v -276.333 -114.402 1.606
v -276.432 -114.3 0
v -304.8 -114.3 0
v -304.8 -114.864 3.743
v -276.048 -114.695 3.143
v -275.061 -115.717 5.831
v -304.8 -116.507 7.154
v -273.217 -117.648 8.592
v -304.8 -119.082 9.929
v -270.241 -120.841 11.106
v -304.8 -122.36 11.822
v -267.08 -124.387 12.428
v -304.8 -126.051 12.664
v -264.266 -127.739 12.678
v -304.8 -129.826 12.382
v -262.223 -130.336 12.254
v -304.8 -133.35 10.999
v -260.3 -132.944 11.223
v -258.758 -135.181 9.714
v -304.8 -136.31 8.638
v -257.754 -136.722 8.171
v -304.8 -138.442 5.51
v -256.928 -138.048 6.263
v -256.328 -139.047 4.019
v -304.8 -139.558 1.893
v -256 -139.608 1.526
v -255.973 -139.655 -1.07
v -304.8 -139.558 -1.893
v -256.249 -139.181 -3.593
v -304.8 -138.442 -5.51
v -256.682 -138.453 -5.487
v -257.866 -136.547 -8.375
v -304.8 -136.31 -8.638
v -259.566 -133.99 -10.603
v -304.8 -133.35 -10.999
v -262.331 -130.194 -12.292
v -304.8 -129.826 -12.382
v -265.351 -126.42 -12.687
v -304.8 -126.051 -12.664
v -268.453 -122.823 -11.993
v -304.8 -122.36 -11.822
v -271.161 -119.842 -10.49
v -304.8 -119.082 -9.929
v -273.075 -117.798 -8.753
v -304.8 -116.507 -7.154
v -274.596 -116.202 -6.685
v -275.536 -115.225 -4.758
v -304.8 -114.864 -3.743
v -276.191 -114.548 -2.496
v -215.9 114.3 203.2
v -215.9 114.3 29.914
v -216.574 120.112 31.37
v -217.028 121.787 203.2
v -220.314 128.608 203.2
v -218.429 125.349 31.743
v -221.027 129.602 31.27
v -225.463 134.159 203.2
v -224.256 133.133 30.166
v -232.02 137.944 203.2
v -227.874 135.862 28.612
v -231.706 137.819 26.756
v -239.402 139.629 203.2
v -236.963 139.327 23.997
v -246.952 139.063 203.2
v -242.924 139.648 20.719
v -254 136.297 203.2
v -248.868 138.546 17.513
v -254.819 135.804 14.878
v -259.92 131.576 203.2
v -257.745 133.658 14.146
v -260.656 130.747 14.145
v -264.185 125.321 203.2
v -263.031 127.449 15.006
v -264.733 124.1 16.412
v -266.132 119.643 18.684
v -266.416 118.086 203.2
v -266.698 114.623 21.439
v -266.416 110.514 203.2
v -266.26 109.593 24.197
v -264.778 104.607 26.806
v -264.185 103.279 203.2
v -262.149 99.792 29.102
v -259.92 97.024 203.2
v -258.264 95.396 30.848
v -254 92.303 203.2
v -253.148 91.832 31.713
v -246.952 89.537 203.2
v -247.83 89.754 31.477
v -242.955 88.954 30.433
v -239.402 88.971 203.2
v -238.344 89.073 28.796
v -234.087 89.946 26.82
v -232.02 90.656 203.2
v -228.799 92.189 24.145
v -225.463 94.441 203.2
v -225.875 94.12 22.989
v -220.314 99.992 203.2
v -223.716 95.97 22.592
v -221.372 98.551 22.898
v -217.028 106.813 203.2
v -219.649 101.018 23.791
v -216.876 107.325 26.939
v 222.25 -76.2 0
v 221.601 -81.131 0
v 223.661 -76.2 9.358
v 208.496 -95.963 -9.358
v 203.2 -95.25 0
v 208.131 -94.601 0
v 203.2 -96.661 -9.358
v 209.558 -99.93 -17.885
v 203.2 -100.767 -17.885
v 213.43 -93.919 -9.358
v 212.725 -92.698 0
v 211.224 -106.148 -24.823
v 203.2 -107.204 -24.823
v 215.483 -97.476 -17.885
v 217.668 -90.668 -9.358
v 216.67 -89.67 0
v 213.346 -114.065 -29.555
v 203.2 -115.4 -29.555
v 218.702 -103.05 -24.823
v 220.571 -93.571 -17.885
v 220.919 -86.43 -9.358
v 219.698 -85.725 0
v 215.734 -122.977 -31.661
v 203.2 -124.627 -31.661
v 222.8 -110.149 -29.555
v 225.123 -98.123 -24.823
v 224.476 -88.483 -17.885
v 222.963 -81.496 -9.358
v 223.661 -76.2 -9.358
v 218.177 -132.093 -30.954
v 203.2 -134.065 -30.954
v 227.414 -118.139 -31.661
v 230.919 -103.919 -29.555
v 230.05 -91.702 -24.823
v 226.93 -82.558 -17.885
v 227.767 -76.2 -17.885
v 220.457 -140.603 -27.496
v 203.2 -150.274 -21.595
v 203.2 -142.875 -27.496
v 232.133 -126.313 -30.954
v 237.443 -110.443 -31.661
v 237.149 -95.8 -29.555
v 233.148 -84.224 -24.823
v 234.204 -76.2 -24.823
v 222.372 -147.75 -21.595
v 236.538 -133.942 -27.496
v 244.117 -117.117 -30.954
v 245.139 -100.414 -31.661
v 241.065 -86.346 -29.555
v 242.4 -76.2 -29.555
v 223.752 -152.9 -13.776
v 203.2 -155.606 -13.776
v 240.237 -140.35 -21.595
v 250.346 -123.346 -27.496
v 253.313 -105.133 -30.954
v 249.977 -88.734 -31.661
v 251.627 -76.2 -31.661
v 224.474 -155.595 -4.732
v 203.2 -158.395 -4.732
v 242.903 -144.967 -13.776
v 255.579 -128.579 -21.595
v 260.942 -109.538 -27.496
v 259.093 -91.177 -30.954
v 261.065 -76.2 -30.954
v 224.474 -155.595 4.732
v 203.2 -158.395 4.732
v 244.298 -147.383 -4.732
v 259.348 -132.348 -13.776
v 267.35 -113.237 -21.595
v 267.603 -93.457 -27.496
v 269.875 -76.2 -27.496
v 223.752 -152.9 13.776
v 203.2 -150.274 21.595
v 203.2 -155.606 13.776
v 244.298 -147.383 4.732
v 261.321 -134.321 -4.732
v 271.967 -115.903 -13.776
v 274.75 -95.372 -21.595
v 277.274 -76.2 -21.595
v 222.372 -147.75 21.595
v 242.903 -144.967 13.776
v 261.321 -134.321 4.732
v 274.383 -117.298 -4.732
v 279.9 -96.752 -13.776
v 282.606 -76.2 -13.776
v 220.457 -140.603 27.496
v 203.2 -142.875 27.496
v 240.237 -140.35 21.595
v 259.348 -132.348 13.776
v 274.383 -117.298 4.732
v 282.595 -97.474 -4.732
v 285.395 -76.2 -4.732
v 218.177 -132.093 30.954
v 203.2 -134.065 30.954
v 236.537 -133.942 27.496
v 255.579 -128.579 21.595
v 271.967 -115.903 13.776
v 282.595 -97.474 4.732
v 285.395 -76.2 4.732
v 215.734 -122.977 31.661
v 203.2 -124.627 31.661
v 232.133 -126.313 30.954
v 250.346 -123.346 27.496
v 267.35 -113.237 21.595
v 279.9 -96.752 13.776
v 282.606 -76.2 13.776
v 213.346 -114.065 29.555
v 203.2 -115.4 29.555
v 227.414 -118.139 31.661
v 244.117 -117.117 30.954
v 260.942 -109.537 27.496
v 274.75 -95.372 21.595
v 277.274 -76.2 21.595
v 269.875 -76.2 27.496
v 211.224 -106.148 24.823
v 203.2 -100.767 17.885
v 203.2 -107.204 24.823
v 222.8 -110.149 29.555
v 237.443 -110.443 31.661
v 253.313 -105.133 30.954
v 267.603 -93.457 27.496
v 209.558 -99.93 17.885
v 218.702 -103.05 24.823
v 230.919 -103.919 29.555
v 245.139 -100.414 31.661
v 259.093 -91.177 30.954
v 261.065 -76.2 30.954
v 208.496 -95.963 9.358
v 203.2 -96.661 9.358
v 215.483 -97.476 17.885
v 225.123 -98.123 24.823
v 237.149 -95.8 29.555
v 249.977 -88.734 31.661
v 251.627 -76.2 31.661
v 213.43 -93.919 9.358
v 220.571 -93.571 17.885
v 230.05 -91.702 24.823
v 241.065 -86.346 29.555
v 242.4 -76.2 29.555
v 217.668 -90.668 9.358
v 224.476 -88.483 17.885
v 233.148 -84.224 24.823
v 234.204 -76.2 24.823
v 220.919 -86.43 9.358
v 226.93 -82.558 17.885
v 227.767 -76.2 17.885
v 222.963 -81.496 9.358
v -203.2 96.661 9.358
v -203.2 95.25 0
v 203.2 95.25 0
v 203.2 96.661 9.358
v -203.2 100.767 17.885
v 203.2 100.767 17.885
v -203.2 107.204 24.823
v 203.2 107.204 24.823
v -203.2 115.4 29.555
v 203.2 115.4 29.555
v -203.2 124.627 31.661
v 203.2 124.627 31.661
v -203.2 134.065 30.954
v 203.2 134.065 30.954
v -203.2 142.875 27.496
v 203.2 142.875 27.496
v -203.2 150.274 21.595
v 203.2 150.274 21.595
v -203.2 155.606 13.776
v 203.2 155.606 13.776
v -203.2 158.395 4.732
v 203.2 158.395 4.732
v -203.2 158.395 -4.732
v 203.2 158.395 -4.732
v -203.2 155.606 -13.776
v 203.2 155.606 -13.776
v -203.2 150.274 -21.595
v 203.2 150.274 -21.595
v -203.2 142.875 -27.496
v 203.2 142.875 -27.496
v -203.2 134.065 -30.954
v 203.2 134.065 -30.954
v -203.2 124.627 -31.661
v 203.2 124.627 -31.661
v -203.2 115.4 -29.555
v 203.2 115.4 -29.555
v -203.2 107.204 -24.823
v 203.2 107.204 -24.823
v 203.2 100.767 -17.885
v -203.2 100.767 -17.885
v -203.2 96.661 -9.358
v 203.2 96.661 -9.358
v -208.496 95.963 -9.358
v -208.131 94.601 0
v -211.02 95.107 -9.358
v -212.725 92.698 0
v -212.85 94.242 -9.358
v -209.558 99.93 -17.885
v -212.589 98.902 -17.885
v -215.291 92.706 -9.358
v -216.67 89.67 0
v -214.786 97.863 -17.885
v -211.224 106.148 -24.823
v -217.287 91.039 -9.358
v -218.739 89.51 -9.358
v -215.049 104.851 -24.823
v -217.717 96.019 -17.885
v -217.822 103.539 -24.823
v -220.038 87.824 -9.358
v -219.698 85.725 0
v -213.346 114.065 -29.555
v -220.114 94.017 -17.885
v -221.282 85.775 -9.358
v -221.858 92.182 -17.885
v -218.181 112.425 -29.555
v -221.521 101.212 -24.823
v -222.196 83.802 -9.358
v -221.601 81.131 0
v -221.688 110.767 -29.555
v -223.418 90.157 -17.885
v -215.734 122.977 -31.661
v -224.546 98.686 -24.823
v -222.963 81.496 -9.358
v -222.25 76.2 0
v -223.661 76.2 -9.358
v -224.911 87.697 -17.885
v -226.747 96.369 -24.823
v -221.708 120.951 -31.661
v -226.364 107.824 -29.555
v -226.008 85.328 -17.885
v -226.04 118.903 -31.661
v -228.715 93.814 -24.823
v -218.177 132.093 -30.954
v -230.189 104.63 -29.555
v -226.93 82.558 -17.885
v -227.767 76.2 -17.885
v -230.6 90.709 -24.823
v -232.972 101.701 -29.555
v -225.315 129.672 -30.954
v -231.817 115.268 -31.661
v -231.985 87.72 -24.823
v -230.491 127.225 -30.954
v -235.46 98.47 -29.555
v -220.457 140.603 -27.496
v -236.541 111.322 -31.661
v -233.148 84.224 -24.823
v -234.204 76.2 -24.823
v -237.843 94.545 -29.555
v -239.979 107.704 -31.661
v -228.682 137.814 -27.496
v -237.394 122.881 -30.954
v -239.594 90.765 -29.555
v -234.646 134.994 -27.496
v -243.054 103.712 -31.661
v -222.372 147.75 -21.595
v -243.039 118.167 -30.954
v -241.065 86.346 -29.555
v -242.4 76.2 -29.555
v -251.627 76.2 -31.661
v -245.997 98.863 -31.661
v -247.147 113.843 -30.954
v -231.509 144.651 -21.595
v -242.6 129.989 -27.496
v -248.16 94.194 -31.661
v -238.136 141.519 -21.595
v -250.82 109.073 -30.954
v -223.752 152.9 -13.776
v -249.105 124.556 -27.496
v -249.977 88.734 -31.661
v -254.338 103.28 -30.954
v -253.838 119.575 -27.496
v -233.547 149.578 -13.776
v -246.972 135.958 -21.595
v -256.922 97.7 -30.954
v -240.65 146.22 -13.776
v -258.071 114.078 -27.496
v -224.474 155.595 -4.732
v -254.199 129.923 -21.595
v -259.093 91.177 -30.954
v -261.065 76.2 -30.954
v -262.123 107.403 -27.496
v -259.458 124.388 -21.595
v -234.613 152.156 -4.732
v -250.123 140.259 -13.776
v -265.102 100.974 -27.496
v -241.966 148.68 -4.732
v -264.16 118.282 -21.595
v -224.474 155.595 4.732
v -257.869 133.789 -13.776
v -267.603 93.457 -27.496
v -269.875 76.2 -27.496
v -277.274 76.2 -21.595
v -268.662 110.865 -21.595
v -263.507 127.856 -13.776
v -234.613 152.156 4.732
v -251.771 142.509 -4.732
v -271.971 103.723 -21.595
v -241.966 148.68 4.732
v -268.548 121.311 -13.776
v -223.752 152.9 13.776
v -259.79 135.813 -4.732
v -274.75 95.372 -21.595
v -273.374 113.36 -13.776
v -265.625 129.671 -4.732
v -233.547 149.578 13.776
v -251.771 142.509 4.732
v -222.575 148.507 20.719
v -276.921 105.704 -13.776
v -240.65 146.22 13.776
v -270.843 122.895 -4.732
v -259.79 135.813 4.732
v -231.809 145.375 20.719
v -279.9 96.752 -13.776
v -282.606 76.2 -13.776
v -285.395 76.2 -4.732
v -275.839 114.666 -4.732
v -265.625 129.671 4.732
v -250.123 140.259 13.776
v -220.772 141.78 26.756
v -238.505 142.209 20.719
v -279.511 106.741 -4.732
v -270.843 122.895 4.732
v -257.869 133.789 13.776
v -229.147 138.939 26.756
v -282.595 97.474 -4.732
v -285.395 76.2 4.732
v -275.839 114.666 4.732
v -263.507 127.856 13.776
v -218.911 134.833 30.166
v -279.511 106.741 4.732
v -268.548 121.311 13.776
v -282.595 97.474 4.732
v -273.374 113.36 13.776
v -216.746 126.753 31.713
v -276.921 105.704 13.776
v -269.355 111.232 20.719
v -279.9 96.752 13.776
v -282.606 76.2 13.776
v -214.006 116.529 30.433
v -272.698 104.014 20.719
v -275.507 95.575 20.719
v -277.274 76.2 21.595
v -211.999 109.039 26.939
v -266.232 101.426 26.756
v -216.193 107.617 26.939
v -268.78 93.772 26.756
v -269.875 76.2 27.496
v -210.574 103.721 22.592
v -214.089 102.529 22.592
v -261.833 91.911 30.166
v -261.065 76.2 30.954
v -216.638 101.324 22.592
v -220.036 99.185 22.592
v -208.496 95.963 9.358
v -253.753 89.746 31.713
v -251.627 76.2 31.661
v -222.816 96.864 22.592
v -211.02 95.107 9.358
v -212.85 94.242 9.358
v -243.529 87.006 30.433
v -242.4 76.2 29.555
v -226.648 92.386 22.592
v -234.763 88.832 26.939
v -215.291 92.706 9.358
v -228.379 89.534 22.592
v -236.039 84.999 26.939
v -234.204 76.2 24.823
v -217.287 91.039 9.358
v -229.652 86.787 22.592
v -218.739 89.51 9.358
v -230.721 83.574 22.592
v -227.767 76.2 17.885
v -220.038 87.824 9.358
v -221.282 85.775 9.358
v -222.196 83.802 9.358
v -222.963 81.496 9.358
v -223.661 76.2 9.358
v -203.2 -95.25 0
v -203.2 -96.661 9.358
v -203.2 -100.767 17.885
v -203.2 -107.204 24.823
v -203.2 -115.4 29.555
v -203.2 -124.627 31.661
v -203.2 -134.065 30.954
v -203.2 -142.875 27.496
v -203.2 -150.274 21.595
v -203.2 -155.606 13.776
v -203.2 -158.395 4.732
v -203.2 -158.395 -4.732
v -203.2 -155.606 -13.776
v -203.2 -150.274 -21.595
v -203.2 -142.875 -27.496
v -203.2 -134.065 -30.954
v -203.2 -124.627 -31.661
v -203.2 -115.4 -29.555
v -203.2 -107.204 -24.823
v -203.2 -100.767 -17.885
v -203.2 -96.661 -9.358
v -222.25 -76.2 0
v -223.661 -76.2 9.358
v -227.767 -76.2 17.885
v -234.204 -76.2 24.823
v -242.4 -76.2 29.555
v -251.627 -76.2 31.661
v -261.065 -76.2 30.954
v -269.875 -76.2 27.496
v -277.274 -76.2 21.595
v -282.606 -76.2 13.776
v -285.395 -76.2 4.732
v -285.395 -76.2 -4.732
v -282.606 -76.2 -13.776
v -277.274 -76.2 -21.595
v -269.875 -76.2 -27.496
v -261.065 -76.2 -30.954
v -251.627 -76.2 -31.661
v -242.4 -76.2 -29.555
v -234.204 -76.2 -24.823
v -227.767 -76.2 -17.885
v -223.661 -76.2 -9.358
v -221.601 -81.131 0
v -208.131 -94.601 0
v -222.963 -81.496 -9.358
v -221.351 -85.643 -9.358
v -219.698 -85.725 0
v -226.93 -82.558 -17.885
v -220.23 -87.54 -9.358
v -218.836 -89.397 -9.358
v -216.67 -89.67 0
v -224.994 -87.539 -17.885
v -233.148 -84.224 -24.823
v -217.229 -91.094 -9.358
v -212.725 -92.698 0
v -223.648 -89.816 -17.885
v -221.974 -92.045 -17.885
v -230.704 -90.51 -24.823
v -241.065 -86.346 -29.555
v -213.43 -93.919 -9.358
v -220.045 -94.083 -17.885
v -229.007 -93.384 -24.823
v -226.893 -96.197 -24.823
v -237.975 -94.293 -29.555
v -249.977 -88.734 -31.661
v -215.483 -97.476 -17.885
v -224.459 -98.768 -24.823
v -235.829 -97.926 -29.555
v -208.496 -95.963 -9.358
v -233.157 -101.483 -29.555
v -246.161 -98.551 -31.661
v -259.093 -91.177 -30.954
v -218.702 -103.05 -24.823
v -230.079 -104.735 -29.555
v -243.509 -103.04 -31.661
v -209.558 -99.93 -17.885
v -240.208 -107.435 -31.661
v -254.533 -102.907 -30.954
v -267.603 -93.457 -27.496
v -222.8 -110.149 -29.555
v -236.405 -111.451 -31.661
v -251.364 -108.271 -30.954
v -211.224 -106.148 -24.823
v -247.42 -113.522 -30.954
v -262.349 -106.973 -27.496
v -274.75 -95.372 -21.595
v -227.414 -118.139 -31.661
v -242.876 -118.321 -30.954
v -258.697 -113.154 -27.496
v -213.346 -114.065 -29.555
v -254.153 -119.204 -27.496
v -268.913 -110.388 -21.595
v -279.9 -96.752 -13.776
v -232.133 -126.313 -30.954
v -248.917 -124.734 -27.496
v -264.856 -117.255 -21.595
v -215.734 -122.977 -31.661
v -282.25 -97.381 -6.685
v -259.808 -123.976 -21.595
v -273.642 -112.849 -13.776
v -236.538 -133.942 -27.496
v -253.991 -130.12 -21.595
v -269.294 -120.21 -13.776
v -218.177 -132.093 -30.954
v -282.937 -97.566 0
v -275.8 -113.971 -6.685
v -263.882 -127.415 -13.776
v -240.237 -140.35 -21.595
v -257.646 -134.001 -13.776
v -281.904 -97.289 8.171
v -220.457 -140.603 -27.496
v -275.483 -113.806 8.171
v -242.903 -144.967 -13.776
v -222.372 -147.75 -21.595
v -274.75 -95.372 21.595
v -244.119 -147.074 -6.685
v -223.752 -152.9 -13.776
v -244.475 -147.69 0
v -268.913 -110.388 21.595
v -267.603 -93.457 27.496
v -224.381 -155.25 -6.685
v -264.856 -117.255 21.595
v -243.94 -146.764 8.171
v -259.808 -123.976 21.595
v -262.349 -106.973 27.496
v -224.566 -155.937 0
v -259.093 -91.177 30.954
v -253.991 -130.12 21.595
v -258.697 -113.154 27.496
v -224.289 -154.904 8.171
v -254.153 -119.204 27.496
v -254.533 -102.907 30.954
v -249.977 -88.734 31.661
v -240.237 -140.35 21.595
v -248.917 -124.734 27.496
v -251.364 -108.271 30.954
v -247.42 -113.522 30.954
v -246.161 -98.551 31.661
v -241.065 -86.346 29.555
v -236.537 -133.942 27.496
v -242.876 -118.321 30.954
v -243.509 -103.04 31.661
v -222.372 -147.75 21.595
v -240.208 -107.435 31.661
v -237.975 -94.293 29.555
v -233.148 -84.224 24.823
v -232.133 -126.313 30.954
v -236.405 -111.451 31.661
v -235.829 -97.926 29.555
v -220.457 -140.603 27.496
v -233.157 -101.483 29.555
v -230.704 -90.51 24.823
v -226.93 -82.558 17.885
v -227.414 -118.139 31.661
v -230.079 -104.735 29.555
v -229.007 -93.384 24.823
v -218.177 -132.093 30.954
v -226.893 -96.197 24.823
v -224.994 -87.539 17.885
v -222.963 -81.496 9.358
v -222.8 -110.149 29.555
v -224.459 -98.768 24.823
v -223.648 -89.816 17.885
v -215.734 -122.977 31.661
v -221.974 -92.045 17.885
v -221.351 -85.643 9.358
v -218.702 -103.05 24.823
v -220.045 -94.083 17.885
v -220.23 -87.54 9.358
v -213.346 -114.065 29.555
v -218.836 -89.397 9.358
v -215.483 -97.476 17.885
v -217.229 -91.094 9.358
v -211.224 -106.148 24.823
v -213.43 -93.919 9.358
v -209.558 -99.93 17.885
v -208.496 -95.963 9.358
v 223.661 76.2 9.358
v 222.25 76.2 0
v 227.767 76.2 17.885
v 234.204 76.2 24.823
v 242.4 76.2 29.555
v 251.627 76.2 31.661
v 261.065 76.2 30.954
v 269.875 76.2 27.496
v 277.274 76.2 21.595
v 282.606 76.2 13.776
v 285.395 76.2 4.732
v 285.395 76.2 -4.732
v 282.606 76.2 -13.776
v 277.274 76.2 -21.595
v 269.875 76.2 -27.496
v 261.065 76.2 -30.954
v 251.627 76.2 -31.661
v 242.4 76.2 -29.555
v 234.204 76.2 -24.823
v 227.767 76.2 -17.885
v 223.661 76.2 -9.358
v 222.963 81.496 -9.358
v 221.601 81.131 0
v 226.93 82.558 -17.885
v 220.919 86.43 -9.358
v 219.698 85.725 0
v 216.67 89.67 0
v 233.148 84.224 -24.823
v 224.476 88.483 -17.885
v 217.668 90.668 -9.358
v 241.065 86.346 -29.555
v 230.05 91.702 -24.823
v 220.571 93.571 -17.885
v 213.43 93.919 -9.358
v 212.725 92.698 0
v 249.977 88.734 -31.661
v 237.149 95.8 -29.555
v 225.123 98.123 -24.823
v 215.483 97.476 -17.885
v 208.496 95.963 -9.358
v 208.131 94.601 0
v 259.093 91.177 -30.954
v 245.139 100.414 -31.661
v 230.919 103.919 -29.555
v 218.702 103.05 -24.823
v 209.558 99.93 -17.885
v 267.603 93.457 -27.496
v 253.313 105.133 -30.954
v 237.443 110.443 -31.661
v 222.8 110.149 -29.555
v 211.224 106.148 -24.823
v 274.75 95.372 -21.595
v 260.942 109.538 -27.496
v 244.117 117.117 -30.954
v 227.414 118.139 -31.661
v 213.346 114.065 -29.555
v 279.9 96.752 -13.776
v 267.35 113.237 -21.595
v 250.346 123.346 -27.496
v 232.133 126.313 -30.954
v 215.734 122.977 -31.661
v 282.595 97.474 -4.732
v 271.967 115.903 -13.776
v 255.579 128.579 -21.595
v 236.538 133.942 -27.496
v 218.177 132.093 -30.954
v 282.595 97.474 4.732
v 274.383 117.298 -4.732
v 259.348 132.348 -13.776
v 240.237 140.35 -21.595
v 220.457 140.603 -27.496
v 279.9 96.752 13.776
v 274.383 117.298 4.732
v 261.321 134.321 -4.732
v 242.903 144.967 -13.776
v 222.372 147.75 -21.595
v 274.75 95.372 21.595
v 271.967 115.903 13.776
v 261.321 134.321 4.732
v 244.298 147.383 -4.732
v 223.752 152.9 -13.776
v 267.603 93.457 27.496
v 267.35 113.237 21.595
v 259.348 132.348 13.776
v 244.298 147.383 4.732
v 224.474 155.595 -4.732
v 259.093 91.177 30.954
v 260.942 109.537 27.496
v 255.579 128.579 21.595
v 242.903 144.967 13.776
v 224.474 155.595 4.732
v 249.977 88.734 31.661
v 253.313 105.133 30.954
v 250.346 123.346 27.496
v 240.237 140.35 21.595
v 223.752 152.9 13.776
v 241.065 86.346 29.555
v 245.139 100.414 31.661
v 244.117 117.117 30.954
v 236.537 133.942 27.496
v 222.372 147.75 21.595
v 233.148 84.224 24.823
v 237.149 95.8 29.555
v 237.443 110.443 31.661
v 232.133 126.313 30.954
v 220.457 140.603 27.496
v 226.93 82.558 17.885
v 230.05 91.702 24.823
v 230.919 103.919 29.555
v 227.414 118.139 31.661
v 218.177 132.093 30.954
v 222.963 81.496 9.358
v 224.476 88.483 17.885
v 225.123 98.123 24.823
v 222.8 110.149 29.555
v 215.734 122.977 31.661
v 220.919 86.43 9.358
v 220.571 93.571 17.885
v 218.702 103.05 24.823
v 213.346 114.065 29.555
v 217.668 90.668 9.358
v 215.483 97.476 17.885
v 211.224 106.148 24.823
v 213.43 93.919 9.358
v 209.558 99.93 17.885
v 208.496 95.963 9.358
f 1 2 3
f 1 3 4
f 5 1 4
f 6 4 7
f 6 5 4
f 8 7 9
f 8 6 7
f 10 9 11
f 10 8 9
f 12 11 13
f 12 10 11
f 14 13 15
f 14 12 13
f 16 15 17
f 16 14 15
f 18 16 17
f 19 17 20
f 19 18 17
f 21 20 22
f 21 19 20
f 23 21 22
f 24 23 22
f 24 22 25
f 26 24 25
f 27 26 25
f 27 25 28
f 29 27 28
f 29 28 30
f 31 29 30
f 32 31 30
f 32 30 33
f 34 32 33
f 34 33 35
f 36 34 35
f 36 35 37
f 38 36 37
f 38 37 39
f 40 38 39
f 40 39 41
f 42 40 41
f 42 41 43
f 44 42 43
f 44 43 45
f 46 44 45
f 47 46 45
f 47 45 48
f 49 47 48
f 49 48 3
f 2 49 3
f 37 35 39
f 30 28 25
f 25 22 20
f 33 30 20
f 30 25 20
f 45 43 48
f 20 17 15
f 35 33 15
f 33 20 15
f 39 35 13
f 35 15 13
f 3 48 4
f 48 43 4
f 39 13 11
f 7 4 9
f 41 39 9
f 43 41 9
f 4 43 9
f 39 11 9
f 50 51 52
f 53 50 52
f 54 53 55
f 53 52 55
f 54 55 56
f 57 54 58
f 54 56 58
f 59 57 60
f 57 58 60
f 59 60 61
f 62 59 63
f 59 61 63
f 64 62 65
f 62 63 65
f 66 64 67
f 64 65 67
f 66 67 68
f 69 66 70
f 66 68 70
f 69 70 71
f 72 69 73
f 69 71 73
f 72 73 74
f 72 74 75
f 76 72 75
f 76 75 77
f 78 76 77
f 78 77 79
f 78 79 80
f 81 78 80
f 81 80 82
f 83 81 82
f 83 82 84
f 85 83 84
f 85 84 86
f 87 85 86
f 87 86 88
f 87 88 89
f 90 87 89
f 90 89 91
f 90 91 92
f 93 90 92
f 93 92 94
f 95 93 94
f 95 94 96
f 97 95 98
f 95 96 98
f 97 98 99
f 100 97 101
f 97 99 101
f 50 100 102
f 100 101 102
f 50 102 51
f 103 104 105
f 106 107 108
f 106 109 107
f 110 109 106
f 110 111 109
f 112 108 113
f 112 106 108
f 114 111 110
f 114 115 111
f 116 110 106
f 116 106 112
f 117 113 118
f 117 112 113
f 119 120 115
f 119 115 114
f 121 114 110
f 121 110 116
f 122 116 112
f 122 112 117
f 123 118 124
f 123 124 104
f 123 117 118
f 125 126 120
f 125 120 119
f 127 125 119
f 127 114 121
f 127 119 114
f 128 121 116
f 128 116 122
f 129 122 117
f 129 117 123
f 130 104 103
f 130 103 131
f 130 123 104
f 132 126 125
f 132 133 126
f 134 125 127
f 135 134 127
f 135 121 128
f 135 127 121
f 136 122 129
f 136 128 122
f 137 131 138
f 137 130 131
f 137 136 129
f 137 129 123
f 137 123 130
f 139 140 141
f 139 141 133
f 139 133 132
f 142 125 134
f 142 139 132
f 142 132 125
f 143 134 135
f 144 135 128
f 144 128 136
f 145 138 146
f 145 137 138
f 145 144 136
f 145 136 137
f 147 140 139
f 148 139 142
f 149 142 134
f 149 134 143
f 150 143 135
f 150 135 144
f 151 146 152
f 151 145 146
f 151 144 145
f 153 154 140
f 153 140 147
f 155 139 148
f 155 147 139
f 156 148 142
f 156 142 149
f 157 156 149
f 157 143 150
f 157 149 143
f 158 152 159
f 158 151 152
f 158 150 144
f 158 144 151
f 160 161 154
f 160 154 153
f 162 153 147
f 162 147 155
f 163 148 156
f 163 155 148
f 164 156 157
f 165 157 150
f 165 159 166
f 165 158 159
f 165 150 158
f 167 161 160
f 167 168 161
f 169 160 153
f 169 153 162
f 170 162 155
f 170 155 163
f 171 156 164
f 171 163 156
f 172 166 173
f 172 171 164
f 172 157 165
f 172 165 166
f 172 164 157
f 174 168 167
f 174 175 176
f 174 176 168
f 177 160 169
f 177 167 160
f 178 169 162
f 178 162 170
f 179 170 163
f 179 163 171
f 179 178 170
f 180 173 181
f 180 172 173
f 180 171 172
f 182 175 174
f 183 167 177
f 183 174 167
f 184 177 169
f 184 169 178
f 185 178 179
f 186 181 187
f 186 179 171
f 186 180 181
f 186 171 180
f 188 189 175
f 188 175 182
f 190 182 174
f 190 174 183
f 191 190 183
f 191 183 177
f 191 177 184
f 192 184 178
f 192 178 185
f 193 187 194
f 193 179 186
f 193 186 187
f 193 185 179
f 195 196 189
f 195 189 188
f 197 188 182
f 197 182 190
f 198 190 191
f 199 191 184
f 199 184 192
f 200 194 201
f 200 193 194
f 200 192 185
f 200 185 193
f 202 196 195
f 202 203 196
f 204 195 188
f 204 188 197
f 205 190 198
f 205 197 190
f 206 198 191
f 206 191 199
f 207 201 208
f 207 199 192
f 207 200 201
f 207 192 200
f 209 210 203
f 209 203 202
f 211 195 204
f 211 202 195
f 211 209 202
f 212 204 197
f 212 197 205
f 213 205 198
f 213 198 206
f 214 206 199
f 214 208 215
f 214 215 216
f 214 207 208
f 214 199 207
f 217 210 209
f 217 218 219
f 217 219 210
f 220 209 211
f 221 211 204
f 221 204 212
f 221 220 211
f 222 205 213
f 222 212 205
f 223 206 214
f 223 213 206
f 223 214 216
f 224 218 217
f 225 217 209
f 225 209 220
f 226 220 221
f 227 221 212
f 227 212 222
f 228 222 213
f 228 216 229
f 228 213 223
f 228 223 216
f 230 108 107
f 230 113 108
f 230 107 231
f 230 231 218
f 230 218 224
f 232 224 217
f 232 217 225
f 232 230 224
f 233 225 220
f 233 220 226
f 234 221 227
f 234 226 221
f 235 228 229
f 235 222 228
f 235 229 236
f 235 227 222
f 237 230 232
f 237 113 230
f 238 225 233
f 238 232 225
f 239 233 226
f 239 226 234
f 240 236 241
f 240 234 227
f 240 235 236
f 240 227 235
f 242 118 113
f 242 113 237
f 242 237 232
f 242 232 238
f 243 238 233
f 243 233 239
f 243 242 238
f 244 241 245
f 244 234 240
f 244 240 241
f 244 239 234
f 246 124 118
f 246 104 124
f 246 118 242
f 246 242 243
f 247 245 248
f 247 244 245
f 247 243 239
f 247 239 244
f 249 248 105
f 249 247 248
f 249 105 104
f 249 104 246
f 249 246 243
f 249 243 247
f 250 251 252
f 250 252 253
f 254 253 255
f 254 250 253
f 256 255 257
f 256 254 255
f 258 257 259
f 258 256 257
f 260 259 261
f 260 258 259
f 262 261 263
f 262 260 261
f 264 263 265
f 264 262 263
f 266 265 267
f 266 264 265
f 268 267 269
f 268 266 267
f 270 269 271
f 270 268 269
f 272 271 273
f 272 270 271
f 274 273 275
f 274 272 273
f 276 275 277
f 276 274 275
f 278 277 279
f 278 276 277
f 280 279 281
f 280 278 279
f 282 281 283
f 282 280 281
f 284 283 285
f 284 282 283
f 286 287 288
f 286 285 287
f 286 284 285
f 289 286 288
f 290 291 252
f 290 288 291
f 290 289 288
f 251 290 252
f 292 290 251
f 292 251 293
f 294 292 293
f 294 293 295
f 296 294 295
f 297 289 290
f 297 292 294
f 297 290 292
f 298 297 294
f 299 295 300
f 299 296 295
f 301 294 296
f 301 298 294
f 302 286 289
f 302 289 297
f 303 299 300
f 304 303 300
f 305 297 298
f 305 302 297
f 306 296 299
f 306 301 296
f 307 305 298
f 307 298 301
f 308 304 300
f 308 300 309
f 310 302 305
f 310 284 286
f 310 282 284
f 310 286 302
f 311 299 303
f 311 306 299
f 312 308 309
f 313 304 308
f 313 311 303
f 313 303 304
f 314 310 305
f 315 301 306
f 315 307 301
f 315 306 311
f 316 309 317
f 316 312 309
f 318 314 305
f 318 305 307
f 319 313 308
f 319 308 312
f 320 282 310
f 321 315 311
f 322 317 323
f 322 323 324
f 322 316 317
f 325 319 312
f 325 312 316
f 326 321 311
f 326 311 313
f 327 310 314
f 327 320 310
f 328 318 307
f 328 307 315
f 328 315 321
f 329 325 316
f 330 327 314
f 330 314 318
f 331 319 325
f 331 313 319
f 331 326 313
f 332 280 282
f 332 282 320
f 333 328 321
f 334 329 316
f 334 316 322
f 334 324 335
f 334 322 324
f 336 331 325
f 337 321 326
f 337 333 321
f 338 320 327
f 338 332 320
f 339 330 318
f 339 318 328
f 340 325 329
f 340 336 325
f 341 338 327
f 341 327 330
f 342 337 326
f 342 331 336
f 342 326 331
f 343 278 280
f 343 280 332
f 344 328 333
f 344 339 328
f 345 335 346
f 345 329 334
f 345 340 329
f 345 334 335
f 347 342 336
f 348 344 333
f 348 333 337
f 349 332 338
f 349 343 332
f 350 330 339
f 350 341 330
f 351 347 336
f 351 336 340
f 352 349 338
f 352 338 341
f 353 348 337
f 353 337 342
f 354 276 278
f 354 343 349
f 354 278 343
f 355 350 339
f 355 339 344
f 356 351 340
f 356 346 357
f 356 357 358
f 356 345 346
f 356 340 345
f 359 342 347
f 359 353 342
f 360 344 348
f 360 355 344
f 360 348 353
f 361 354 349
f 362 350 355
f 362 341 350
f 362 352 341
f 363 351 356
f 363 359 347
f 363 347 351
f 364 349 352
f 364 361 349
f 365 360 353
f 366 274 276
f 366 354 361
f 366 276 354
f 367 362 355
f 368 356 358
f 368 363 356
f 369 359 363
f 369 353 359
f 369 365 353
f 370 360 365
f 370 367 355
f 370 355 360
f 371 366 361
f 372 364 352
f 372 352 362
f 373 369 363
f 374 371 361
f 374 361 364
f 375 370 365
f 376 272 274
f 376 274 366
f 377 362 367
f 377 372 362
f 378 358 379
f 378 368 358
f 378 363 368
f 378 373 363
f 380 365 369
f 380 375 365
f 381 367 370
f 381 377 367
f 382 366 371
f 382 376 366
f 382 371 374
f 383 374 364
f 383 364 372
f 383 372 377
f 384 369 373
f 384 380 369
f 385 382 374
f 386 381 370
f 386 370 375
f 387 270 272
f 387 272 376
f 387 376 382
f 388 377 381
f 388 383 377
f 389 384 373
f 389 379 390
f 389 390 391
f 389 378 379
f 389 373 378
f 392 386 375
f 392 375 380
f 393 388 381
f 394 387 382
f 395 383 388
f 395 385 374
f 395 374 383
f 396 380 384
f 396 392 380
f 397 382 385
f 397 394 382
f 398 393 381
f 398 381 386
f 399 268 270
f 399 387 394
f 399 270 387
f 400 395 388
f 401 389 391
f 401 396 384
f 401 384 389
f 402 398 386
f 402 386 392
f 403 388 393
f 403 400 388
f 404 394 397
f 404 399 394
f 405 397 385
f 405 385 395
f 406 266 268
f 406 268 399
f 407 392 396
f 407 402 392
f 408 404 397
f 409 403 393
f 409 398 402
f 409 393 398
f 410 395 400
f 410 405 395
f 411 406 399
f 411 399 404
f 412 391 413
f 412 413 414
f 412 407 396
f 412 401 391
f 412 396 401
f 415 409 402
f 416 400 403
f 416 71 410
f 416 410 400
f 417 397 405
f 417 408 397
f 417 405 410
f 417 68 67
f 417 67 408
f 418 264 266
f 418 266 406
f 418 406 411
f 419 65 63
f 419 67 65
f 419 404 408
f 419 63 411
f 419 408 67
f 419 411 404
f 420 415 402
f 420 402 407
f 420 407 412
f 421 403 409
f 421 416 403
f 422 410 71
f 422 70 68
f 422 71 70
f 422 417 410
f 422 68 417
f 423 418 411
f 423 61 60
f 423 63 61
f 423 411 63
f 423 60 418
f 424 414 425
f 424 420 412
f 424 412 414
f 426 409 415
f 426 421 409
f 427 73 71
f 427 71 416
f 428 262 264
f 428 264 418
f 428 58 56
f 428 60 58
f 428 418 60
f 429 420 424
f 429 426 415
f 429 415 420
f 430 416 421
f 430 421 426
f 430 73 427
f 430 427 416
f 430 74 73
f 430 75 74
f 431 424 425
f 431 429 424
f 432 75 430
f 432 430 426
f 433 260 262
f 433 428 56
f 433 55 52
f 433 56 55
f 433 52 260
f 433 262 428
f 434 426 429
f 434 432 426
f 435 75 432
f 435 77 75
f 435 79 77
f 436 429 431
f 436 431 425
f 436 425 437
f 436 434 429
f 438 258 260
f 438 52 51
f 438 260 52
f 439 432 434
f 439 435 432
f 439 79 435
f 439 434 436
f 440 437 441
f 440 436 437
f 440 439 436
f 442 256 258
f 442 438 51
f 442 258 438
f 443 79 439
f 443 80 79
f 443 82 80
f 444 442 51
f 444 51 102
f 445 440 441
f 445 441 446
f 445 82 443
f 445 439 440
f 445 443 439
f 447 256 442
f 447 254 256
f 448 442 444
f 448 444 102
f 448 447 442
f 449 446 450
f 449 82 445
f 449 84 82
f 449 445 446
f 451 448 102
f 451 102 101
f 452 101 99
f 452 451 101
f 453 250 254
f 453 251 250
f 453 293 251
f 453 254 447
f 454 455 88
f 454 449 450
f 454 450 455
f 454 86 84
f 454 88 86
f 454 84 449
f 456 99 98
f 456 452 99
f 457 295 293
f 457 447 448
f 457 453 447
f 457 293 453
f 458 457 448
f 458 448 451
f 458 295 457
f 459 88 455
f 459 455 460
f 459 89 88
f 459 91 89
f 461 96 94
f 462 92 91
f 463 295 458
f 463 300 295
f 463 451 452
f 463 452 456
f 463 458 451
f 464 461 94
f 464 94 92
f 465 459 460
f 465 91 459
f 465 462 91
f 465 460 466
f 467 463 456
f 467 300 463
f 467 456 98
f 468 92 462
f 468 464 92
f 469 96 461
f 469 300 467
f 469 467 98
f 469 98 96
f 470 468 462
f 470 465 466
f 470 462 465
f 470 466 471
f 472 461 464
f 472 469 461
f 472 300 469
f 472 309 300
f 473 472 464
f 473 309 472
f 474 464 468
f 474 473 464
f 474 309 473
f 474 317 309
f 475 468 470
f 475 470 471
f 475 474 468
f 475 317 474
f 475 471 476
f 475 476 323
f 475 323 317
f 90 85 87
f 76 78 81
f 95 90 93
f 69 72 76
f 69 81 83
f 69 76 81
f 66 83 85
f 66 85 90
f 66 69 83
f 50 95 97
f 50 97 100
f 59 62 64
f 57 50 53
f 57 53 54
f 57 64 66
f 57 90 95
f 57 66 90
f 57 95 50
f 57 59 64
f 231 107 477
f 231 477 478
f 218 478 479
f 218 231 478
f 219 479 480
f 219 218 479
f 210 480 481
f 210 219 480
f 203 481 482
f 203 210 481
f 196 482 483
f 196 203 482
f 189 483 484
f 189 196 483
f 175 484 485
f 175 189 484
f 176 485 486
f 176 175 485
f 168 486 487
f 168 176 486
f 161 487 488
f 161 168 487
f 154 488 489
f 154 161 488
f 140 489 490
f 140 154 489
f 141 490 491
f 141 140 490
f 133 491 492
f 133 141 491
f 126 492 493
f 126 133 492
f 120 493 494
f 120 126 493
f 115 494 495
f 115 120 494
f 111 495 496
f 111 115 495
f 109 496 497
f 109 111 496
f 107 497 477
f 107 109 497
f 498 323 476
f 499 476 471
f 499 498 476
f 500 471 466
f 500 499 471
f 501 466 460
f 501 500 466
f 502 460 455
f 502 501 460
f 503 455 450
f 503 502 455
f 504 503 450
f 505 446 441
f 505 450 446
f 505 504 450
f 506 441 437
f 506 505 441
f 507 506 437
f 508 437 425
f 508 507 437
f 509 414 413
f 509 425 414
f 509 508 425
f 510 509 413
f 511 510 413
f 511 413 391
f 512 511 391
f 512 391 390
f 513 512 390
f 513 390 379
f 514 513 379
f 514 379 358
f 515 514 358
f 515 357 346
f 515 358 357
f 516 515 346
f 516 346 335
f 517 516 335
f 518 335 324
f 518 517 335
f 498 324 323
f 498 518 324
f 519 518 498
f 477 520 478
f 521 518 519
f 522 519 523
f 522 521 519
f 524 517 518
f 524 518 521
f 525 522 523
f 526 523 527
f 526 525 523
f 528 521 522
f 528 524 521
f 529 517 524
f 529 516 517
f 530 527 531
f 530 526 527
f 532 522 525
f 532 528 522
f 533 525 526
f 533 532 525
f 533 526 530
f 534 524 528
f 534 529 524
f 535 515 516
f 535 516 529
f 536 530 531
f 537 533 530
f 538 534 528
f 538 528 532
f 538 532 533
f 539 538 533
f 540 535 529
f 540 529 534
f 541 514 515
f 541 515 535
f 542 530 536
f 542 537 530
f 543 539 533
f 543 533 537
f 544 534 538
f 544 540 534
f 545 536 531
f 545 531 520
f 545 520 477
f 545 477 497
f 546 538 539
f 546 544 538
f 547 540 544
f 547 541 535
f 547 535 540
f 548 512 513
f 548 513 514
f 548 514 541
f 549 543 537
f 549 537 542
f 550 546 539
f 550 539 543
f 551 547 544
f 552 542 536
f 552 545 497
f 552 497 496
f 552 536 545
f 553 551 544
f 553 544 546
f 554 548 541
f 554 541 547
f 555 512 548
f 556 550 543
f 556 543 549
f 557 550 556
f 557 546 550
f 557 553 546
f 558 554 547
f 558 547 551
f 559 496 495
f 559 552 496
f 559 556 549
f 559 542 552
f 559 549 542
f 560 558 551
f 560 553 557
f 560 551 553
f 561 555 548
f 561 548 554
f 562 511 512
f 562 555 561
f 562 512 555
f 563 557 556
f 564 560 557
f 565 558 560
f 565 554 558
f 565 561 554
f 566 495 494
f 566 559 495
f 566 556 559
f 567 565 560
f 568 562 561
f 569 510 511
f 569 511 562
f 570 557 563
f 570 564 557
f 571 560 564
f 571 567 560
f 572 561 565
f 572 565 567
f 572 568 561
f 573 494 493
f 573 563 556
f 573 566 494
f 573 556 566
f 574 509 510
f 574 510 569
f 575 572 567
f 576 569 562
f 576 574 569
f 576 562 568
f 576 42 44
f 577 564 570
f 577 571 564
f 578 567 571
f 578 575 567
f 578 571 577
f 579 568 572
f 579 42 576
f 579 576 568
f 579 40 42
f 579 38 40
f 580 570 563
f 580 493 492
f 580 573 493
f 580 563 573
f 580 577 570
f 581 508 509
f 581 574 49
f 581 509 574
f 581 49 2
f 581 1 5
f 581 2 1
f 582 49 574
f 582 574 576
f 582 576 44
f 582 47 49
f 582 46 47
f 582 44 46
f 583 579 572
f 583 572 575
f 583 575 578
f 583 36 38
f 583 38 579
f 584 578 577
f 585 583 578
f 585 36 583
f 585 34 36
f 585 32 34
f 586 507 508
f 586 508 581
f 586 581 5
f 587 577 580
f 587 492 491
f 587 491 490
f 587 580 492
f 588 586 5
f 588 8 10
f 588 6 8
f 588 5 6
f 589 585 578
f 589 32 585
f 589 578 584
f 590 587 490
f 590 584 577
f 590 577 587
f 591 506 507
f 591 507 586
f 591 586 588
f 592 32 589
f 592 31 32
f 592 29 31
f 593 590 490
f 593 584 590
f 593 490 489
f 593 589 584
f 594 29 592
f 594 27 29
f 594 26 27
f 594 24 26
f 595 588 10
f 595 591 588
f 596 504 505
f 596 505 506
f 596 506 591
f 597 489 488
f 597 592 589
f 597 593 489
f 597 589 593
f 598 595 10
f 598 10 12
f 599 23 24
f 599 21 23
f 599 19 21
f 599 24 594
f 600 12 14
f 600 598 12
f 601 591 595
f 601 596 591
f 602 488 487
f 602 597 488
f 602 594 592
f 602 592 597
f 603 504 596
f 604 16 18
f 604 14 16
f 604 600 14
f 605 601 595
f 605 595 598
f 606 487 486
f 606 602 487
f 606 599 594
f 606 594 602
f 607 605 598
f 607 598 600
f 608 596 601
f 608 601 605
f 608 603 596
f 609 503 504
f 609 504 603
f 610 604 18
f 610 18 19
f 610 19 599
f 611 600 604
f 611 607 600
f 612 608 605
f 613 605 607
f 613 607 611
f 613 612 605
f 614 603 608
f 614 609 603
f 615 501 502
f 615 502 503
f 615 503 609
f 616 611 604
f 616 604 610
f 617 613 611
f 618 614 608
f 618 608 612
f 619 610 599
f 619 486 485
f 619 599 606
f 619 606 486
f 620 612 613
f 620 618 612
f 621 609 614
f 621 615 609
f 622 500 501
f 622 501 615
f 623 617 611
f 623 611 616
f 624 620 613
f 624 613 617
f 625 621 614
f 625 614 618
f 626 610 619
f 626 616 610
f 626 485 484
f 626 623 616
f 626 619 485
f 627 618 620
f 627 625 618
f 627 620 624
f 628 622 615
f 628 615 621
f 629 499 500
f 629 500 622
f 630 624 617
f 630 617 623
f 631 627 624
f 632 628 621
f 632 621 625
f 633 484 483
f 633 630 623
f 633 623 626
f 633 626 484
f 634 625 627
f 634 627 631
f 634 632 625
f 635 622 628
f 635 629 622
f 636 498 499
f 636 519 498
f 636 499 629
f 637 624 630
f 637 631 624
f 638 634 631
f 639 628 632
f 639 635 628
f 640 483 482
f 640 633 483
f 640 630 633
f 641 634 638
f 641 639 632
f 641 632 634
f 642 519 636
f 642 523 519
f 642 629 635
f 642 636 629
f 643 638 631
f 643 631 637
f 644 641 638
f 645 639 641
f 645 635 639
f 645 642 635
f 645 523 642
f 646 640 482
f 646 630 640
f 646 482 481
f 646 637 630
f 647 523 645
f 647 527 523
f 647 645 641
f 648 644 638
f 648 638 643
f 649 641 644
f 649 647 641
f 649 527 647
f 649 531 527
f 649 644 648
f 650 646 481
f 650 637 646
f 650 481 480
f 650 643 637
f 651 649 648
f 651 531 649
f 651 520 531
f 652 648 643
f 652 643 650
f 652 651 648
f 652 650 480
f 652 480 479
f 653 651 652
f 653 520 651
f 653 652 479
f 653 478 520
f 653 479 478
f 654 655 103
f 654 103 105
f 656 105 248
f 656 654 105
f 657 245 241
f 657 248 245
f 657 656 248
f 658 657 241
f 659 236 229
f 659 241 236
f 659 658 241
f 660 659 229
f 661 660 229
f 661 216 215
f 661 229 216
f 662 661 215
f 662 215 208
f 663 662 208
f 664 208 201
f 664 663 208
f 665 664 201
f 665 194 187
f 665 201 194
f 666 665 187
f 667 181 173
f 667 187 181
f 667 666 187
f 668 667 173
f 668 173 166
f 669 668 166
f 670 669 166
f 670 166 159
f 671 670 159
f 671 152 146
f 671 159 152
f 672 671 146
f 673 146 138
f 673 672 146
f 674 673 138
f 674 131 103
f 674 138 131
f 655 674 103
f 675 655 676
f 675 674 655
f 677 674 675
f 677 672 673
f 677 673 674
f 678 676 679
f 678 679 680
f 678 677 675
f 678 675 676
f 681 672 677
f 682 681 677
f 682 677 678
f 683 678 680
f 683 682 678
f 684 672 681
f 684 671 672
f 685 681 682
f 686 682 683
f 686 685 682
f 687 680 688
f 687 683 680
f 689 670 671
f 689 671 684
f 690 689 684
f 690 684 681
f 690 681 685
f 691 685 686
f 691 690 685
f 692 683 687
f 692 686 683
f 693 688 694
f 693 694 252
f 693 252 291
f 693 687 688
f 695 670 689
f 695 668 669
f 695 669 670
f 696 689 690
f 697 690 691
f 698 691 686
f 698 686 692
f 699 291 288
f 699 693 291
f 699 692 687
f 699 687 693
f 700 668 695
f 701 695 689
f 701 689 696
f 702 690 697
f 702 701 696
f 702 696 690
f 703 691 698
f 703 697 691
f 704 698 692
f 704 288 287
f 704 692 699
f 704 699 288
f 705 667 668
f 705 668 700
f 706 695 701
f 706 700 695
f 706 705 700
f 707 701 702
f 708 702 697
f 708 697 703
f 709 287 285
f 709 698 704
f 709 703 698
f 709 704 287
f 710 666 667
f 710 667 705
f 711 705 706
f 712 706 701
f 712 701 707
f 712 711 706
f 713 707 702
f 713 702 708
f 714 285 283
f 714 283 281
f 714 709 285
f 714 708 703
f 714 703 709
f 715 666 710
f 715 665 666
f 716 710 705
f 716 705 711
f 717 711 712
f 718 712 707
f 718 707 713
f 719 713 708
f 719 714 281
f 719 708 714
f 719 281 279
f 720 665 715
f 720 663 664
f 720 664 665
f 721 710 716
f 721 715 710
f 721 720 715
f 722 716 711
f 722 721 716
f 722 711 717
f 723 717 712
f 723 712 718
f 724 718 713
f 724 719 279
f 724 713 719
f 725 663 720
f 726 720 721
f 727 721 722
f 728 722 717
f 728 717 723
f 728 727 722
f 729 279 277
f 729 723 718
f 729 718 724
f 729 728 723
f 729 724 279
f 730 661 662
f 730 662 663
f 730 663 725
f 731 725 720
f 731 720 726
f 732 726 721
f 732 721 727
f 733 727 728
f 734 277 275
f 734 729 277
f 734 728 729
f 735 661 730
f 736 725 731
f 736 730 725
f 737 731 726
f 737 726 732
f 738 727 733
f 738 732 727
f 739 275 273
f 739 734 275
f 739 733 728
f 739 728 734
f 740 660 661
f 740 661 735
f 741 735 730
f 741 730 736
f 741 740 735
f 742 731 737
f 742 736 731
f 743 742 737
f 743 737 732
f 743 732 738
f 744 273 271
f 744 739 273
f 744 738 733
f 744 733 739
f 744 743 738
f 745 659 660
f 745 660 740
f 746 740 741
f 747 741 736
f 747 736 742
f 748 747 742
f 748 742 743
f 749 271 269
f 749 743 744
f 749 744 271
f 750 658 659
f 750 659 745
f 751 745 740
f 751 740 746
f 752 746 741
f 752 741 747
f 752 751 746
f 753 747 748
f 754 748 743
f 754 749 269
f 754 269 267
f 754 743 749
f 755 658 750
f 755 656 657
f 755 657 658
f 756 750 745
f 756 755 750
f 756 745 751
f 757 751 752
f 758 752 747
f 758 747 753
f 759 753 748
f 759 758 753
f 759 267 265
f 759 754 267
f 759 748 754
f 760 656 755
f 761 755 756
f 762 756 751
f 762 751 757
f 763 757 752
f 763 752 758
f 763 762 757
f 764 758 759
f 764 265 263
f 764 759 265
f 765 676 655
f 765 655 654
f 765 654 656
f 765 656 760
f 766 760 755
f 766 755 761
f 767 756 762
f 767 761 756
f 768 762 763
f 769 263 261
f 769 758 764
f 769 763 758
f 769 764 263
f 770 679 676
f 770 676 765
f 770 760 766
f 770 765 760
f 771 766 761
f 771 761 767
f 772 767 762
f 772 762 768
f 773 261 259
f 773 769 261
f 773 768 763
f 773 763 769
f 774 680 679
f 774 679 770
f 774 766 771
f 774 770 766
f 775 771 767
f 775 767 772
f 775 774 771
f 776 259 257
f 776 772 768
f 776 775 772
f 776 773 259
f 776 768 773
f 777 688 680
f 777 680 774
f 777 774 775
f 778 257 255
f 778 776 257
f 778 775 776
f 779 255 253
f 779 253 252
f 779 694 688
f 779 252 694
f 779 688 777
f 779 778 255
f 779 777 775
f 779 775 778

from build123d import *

# Parameters (mm, degrees)
F0_R     = 31.75
F3_R     = 12.7
F4_DEPTH = 304.8
F5_R     = 25.4
F6_DEPTH = 203.2


with BuildPart() as f2:
    # F2: sweep along a path in F1
    with BuildLine(Plane.XY) as f2_path:
        ThreePointArc((-203.2, 127), (-239.121024, 112.121024), (-254, 76.2))
        Line((-254, 76.2), (-254, -76.2))
        ThreePointArc((-254, -76.2), (-239.121024, -112.121024), (-203.2, -127))
        Line((-203.2, -127), (203.2, -127))
        ThreePointArc((203.2, -127), (239.121024, -112.121024), (254, -76.2))
        Line((254, -76.2), (254, 76.2))
        ThreePointArc((254, 76.2), (239.121024, 112.121024), (203.2, 127))
        Line((203.2, 127), (-203.2, 127))
    # F0 (on Front) → F2 (sweep)
    with BuildSketch(Plane.XZ):
        with Locations((-254, 0)):
            Circle(F0_R)
    sweep(path=f2_path.line)

    # F3 (on Right) → F4 (join)
    with BuildSketch(Plane.YZ):
        with Locations((-127, 0)):
            Circle(F3_R)
    extrude(amount=-F4_DEPTH)

    # F5 (on Top) → F6 (join)
    with BuildSketch(Plane.XY):
        with Locations((-241.3, 114.3)):
            Circle(F5_R)
    extrude(amount=F6_DEPTH)


solid = f2.part
